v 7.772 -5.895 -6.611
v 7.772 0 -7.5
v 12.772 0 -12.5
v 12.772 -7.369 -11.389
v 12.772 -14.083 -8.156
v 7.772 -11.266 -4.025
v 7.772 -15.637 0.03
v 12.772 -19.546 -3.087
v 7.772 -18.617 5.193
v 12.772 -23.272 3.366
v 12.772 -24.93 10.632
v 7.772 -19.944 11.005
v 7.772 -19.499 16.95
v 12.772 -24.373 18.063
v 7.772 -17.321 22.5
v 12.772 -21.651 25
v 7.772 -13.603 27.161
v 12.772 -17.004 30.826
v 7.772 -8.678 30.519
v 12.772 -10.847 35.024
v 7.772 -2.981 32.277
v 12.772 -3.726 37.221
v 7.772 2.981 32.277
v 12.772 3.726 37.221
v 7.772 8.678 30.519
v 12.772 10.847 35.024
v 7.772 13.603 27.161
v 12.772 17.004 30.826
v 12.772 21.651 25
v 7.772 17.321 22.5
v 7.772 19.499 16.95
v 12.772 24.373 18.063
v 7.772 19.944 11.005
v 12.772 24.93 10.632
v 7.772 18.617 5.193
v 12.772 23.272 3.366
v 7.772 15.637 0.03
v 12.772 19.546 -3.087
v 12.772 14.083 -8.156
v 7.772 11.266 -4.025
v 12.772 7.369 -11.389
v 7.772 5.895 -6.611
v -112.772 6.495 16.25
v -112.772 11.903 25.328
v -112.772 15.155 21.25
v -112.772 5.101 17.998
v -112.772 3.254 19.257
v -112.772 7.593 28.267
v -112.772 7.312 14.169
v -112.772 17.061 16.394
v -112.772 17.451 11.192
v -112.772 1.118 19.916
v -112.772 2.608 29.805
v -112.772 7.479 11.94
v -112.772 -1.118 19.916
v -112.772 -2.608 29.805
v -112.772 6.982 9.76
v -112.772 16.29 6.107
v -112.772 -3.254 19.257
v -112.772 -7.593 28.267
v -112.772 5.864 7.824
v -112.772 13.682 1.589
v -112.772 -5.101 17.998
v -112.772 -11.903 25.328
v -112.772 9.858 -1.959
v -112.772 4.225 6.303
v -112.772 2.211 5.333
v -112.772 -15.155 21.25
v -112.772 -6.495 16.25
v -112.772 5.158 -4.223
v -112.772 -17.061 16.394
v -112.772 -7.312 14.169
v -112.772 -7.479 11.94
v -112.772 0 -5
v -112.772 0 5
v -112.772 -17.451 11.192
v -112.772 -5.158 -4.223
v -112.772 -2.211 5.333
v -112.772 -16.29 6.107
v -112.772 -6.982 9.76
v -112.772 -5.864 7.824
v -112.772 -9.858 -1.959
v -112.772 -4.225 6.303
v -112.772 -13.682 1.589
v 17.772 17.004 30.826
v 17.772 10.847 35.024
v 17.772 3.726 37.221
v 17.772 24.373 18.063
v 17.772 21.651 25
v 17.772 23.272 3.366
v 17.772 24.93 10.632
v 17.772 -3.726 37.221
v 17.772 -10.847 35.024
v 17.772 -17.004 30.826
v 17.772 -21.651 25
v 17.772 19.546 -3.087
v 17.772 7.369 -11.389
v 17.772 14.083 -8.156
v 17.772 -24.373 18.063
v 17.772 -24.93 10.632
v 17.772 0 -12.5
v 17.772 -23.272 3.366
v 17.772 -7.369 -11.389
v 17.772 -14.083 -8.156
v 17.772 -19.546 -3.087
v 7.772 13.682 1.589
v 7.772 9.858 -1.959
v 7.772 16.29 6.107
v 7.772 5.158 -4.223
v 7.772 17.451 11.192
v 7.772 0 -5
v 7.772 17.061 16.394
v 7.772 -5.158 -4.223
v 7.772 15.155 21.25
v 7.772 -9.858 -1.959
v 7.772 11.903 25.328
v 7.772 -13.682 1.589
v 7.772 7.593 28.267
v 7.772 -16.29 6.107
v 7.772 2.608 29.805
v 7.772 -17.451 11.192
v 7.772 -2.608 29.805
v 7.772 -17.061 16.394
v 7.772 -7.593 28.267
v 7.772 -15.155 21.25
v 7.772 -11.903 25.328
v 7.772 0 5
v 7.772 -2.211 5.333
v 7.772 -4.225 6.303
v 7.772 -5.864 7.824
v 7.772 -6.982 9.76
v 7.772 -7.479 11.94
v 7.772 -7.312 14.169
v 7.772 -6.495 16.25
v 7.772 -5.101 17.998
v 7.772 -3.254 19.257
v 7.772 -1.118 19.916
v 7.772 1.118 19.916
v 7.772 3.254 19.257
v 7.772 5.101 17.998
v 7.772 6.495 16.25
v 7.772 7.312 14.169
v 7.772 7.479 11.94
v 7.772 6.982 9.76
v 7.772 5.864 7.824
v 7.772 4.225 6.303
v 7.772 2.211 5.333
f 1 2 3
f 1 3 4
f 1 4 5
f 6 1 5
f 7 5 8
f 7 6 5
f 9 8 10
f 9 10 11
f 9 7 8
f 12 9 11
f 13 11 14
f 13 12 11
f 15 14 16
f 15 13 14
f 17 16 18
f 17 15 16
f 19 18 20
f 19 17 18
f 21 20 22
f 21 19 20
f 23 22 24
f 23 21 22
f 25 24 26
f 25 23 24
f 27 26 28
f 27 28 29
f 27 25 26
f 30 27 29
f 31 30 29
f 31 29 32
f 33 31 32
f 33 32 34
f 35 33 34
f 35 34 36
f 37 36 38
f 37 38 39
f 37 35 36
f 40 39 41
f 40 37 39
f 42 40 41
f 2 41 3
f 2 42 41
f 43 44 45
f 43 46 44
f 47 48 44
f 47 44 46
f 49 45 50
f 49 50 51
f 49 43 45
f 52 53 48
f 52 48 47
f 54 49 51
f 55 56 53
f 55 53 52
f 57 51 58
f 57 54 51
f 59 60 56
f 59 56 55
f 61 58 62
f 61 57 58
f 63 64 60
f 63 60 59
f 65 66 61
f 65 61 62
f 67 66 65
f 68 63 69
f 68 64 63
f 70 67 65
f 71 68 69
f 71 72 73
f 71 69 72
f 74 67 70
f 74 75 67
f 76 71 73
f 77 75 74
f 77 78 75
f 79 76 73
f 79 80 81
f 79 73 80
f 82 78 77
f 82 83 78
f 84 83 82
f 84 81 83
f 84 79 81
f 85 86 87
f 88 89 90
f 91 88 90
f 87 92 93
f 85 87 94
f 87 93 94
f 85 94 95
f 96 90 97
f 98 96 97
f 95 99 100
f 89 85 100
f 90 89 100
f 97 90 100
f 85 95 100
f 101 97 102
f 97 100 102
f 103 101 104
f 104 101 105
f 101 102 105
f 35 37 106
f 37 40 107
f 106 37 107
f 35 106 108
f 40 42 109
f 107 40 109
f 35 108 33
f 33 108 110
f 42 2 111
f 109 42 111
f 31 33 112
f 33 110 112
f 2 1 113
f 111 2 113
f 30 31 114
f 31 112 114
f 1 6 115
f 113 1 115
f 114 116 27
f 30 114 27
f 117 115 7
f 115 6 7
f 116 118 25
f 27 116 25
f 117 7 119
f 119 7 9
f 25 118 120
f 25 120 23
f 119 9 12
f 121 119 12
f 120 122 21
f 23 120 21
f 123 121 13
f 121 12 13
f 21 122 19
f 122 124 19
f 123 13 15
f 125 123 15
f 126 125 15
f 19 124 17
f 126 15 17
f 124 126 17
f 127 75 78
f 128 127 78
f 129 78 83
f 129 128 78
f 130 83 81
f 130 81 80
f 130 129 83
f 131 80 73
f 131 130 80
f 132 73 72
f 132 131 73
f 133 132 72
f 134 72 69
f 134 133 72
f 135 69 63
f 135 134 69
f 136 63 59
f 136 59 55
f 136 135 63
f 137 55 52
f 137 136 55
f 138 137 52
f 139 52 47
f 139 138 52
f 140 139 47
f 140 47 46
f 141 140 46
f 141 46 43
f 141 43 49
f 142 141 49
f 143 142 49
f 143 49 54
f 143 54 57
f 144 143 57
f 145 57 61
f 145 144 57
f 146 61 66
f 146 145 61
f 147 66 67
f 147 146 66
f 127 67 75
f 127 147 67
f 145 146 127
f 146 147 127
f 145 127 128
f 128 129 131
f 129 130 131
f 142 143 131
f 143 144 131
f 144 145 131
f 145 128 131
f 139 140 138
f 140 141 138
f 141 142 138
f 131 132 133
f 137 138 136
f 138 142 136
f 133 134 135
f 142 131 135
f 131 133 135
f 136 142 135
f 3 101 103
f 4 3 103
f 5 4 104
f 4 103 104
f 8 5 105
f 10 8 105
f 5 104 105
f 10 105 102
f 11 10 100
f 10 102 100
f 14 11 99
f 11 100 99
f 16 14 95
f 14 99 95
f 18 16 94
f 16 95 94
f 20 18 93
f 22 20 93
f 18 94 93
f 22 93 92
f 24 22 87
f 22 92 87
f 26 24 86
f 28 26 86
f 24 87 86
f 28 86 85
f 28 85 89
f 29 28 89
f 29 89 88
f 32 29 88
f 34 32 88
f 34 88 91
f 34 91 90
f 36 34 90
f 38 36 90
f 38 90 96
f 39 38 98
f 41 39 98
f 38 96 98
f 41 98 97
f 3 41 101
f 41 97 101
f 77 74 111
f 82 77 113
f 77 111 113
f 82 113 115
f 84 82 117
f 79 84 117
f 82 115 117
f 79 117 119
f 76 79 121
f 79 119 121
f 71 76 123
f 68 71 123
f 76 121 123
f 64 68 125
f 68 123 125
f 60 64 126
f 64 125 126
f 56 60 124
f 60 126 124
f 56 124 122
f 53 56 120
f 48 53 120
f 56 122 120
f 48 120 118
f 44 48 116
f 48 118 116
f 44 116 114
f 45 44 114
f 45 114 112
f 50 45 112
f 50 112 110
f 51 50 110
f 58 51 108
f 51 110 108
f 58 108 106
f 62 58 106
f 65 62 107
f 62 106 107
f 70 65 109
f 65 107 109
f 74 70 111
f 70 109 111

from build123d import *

# Parameters (mm, degrees)
F0_W     = 5
F0_H     = 10
F0_W_2   = 20.5440539549
F2_SIZE  = 5
F3_DEPTH = 100


with BuildPart() as f1:
    # F0 (on Front) → F1 (revolve)
    with BuildSketch(Plane.XZ):
        Polygon((12.7720269775, 5), (12.7720269775, -5), (7.7720269775, -5), (7.7720269775, -12.5), (17.7720269775, -12.5), (17.7720269775, 12.5), (7.7720269775, 12.5), (7.7720269775, 5), align=None)
        with Locations((10.2720269775, 0)):
            Rectangle(F0_W, F0_H)
        with Locations((-2.5, 0)):
            Rectangle(F0_W_2, F0_H)
    revolve(axis=Axis((12.7720269775, 0, 12.5), (-1, 0, 0)))

    # F2
    f2_edges = [f1.edges().sort_by_distance(p)[0] for p in [
        (7.772027, 0, 37.5),
    ]]
    chamfer(f2_edges, length=F2_SIZE)

    # F3 (add): a face of the model
    f3_faces = [f1.faces().sort_by_distance(p)[0] for p in [
        (-12.7720269775, 0, 20.4949747468),
    ]]
    extrude(f3_faces, amount=F3_DEPTH)


solid = f1.part
